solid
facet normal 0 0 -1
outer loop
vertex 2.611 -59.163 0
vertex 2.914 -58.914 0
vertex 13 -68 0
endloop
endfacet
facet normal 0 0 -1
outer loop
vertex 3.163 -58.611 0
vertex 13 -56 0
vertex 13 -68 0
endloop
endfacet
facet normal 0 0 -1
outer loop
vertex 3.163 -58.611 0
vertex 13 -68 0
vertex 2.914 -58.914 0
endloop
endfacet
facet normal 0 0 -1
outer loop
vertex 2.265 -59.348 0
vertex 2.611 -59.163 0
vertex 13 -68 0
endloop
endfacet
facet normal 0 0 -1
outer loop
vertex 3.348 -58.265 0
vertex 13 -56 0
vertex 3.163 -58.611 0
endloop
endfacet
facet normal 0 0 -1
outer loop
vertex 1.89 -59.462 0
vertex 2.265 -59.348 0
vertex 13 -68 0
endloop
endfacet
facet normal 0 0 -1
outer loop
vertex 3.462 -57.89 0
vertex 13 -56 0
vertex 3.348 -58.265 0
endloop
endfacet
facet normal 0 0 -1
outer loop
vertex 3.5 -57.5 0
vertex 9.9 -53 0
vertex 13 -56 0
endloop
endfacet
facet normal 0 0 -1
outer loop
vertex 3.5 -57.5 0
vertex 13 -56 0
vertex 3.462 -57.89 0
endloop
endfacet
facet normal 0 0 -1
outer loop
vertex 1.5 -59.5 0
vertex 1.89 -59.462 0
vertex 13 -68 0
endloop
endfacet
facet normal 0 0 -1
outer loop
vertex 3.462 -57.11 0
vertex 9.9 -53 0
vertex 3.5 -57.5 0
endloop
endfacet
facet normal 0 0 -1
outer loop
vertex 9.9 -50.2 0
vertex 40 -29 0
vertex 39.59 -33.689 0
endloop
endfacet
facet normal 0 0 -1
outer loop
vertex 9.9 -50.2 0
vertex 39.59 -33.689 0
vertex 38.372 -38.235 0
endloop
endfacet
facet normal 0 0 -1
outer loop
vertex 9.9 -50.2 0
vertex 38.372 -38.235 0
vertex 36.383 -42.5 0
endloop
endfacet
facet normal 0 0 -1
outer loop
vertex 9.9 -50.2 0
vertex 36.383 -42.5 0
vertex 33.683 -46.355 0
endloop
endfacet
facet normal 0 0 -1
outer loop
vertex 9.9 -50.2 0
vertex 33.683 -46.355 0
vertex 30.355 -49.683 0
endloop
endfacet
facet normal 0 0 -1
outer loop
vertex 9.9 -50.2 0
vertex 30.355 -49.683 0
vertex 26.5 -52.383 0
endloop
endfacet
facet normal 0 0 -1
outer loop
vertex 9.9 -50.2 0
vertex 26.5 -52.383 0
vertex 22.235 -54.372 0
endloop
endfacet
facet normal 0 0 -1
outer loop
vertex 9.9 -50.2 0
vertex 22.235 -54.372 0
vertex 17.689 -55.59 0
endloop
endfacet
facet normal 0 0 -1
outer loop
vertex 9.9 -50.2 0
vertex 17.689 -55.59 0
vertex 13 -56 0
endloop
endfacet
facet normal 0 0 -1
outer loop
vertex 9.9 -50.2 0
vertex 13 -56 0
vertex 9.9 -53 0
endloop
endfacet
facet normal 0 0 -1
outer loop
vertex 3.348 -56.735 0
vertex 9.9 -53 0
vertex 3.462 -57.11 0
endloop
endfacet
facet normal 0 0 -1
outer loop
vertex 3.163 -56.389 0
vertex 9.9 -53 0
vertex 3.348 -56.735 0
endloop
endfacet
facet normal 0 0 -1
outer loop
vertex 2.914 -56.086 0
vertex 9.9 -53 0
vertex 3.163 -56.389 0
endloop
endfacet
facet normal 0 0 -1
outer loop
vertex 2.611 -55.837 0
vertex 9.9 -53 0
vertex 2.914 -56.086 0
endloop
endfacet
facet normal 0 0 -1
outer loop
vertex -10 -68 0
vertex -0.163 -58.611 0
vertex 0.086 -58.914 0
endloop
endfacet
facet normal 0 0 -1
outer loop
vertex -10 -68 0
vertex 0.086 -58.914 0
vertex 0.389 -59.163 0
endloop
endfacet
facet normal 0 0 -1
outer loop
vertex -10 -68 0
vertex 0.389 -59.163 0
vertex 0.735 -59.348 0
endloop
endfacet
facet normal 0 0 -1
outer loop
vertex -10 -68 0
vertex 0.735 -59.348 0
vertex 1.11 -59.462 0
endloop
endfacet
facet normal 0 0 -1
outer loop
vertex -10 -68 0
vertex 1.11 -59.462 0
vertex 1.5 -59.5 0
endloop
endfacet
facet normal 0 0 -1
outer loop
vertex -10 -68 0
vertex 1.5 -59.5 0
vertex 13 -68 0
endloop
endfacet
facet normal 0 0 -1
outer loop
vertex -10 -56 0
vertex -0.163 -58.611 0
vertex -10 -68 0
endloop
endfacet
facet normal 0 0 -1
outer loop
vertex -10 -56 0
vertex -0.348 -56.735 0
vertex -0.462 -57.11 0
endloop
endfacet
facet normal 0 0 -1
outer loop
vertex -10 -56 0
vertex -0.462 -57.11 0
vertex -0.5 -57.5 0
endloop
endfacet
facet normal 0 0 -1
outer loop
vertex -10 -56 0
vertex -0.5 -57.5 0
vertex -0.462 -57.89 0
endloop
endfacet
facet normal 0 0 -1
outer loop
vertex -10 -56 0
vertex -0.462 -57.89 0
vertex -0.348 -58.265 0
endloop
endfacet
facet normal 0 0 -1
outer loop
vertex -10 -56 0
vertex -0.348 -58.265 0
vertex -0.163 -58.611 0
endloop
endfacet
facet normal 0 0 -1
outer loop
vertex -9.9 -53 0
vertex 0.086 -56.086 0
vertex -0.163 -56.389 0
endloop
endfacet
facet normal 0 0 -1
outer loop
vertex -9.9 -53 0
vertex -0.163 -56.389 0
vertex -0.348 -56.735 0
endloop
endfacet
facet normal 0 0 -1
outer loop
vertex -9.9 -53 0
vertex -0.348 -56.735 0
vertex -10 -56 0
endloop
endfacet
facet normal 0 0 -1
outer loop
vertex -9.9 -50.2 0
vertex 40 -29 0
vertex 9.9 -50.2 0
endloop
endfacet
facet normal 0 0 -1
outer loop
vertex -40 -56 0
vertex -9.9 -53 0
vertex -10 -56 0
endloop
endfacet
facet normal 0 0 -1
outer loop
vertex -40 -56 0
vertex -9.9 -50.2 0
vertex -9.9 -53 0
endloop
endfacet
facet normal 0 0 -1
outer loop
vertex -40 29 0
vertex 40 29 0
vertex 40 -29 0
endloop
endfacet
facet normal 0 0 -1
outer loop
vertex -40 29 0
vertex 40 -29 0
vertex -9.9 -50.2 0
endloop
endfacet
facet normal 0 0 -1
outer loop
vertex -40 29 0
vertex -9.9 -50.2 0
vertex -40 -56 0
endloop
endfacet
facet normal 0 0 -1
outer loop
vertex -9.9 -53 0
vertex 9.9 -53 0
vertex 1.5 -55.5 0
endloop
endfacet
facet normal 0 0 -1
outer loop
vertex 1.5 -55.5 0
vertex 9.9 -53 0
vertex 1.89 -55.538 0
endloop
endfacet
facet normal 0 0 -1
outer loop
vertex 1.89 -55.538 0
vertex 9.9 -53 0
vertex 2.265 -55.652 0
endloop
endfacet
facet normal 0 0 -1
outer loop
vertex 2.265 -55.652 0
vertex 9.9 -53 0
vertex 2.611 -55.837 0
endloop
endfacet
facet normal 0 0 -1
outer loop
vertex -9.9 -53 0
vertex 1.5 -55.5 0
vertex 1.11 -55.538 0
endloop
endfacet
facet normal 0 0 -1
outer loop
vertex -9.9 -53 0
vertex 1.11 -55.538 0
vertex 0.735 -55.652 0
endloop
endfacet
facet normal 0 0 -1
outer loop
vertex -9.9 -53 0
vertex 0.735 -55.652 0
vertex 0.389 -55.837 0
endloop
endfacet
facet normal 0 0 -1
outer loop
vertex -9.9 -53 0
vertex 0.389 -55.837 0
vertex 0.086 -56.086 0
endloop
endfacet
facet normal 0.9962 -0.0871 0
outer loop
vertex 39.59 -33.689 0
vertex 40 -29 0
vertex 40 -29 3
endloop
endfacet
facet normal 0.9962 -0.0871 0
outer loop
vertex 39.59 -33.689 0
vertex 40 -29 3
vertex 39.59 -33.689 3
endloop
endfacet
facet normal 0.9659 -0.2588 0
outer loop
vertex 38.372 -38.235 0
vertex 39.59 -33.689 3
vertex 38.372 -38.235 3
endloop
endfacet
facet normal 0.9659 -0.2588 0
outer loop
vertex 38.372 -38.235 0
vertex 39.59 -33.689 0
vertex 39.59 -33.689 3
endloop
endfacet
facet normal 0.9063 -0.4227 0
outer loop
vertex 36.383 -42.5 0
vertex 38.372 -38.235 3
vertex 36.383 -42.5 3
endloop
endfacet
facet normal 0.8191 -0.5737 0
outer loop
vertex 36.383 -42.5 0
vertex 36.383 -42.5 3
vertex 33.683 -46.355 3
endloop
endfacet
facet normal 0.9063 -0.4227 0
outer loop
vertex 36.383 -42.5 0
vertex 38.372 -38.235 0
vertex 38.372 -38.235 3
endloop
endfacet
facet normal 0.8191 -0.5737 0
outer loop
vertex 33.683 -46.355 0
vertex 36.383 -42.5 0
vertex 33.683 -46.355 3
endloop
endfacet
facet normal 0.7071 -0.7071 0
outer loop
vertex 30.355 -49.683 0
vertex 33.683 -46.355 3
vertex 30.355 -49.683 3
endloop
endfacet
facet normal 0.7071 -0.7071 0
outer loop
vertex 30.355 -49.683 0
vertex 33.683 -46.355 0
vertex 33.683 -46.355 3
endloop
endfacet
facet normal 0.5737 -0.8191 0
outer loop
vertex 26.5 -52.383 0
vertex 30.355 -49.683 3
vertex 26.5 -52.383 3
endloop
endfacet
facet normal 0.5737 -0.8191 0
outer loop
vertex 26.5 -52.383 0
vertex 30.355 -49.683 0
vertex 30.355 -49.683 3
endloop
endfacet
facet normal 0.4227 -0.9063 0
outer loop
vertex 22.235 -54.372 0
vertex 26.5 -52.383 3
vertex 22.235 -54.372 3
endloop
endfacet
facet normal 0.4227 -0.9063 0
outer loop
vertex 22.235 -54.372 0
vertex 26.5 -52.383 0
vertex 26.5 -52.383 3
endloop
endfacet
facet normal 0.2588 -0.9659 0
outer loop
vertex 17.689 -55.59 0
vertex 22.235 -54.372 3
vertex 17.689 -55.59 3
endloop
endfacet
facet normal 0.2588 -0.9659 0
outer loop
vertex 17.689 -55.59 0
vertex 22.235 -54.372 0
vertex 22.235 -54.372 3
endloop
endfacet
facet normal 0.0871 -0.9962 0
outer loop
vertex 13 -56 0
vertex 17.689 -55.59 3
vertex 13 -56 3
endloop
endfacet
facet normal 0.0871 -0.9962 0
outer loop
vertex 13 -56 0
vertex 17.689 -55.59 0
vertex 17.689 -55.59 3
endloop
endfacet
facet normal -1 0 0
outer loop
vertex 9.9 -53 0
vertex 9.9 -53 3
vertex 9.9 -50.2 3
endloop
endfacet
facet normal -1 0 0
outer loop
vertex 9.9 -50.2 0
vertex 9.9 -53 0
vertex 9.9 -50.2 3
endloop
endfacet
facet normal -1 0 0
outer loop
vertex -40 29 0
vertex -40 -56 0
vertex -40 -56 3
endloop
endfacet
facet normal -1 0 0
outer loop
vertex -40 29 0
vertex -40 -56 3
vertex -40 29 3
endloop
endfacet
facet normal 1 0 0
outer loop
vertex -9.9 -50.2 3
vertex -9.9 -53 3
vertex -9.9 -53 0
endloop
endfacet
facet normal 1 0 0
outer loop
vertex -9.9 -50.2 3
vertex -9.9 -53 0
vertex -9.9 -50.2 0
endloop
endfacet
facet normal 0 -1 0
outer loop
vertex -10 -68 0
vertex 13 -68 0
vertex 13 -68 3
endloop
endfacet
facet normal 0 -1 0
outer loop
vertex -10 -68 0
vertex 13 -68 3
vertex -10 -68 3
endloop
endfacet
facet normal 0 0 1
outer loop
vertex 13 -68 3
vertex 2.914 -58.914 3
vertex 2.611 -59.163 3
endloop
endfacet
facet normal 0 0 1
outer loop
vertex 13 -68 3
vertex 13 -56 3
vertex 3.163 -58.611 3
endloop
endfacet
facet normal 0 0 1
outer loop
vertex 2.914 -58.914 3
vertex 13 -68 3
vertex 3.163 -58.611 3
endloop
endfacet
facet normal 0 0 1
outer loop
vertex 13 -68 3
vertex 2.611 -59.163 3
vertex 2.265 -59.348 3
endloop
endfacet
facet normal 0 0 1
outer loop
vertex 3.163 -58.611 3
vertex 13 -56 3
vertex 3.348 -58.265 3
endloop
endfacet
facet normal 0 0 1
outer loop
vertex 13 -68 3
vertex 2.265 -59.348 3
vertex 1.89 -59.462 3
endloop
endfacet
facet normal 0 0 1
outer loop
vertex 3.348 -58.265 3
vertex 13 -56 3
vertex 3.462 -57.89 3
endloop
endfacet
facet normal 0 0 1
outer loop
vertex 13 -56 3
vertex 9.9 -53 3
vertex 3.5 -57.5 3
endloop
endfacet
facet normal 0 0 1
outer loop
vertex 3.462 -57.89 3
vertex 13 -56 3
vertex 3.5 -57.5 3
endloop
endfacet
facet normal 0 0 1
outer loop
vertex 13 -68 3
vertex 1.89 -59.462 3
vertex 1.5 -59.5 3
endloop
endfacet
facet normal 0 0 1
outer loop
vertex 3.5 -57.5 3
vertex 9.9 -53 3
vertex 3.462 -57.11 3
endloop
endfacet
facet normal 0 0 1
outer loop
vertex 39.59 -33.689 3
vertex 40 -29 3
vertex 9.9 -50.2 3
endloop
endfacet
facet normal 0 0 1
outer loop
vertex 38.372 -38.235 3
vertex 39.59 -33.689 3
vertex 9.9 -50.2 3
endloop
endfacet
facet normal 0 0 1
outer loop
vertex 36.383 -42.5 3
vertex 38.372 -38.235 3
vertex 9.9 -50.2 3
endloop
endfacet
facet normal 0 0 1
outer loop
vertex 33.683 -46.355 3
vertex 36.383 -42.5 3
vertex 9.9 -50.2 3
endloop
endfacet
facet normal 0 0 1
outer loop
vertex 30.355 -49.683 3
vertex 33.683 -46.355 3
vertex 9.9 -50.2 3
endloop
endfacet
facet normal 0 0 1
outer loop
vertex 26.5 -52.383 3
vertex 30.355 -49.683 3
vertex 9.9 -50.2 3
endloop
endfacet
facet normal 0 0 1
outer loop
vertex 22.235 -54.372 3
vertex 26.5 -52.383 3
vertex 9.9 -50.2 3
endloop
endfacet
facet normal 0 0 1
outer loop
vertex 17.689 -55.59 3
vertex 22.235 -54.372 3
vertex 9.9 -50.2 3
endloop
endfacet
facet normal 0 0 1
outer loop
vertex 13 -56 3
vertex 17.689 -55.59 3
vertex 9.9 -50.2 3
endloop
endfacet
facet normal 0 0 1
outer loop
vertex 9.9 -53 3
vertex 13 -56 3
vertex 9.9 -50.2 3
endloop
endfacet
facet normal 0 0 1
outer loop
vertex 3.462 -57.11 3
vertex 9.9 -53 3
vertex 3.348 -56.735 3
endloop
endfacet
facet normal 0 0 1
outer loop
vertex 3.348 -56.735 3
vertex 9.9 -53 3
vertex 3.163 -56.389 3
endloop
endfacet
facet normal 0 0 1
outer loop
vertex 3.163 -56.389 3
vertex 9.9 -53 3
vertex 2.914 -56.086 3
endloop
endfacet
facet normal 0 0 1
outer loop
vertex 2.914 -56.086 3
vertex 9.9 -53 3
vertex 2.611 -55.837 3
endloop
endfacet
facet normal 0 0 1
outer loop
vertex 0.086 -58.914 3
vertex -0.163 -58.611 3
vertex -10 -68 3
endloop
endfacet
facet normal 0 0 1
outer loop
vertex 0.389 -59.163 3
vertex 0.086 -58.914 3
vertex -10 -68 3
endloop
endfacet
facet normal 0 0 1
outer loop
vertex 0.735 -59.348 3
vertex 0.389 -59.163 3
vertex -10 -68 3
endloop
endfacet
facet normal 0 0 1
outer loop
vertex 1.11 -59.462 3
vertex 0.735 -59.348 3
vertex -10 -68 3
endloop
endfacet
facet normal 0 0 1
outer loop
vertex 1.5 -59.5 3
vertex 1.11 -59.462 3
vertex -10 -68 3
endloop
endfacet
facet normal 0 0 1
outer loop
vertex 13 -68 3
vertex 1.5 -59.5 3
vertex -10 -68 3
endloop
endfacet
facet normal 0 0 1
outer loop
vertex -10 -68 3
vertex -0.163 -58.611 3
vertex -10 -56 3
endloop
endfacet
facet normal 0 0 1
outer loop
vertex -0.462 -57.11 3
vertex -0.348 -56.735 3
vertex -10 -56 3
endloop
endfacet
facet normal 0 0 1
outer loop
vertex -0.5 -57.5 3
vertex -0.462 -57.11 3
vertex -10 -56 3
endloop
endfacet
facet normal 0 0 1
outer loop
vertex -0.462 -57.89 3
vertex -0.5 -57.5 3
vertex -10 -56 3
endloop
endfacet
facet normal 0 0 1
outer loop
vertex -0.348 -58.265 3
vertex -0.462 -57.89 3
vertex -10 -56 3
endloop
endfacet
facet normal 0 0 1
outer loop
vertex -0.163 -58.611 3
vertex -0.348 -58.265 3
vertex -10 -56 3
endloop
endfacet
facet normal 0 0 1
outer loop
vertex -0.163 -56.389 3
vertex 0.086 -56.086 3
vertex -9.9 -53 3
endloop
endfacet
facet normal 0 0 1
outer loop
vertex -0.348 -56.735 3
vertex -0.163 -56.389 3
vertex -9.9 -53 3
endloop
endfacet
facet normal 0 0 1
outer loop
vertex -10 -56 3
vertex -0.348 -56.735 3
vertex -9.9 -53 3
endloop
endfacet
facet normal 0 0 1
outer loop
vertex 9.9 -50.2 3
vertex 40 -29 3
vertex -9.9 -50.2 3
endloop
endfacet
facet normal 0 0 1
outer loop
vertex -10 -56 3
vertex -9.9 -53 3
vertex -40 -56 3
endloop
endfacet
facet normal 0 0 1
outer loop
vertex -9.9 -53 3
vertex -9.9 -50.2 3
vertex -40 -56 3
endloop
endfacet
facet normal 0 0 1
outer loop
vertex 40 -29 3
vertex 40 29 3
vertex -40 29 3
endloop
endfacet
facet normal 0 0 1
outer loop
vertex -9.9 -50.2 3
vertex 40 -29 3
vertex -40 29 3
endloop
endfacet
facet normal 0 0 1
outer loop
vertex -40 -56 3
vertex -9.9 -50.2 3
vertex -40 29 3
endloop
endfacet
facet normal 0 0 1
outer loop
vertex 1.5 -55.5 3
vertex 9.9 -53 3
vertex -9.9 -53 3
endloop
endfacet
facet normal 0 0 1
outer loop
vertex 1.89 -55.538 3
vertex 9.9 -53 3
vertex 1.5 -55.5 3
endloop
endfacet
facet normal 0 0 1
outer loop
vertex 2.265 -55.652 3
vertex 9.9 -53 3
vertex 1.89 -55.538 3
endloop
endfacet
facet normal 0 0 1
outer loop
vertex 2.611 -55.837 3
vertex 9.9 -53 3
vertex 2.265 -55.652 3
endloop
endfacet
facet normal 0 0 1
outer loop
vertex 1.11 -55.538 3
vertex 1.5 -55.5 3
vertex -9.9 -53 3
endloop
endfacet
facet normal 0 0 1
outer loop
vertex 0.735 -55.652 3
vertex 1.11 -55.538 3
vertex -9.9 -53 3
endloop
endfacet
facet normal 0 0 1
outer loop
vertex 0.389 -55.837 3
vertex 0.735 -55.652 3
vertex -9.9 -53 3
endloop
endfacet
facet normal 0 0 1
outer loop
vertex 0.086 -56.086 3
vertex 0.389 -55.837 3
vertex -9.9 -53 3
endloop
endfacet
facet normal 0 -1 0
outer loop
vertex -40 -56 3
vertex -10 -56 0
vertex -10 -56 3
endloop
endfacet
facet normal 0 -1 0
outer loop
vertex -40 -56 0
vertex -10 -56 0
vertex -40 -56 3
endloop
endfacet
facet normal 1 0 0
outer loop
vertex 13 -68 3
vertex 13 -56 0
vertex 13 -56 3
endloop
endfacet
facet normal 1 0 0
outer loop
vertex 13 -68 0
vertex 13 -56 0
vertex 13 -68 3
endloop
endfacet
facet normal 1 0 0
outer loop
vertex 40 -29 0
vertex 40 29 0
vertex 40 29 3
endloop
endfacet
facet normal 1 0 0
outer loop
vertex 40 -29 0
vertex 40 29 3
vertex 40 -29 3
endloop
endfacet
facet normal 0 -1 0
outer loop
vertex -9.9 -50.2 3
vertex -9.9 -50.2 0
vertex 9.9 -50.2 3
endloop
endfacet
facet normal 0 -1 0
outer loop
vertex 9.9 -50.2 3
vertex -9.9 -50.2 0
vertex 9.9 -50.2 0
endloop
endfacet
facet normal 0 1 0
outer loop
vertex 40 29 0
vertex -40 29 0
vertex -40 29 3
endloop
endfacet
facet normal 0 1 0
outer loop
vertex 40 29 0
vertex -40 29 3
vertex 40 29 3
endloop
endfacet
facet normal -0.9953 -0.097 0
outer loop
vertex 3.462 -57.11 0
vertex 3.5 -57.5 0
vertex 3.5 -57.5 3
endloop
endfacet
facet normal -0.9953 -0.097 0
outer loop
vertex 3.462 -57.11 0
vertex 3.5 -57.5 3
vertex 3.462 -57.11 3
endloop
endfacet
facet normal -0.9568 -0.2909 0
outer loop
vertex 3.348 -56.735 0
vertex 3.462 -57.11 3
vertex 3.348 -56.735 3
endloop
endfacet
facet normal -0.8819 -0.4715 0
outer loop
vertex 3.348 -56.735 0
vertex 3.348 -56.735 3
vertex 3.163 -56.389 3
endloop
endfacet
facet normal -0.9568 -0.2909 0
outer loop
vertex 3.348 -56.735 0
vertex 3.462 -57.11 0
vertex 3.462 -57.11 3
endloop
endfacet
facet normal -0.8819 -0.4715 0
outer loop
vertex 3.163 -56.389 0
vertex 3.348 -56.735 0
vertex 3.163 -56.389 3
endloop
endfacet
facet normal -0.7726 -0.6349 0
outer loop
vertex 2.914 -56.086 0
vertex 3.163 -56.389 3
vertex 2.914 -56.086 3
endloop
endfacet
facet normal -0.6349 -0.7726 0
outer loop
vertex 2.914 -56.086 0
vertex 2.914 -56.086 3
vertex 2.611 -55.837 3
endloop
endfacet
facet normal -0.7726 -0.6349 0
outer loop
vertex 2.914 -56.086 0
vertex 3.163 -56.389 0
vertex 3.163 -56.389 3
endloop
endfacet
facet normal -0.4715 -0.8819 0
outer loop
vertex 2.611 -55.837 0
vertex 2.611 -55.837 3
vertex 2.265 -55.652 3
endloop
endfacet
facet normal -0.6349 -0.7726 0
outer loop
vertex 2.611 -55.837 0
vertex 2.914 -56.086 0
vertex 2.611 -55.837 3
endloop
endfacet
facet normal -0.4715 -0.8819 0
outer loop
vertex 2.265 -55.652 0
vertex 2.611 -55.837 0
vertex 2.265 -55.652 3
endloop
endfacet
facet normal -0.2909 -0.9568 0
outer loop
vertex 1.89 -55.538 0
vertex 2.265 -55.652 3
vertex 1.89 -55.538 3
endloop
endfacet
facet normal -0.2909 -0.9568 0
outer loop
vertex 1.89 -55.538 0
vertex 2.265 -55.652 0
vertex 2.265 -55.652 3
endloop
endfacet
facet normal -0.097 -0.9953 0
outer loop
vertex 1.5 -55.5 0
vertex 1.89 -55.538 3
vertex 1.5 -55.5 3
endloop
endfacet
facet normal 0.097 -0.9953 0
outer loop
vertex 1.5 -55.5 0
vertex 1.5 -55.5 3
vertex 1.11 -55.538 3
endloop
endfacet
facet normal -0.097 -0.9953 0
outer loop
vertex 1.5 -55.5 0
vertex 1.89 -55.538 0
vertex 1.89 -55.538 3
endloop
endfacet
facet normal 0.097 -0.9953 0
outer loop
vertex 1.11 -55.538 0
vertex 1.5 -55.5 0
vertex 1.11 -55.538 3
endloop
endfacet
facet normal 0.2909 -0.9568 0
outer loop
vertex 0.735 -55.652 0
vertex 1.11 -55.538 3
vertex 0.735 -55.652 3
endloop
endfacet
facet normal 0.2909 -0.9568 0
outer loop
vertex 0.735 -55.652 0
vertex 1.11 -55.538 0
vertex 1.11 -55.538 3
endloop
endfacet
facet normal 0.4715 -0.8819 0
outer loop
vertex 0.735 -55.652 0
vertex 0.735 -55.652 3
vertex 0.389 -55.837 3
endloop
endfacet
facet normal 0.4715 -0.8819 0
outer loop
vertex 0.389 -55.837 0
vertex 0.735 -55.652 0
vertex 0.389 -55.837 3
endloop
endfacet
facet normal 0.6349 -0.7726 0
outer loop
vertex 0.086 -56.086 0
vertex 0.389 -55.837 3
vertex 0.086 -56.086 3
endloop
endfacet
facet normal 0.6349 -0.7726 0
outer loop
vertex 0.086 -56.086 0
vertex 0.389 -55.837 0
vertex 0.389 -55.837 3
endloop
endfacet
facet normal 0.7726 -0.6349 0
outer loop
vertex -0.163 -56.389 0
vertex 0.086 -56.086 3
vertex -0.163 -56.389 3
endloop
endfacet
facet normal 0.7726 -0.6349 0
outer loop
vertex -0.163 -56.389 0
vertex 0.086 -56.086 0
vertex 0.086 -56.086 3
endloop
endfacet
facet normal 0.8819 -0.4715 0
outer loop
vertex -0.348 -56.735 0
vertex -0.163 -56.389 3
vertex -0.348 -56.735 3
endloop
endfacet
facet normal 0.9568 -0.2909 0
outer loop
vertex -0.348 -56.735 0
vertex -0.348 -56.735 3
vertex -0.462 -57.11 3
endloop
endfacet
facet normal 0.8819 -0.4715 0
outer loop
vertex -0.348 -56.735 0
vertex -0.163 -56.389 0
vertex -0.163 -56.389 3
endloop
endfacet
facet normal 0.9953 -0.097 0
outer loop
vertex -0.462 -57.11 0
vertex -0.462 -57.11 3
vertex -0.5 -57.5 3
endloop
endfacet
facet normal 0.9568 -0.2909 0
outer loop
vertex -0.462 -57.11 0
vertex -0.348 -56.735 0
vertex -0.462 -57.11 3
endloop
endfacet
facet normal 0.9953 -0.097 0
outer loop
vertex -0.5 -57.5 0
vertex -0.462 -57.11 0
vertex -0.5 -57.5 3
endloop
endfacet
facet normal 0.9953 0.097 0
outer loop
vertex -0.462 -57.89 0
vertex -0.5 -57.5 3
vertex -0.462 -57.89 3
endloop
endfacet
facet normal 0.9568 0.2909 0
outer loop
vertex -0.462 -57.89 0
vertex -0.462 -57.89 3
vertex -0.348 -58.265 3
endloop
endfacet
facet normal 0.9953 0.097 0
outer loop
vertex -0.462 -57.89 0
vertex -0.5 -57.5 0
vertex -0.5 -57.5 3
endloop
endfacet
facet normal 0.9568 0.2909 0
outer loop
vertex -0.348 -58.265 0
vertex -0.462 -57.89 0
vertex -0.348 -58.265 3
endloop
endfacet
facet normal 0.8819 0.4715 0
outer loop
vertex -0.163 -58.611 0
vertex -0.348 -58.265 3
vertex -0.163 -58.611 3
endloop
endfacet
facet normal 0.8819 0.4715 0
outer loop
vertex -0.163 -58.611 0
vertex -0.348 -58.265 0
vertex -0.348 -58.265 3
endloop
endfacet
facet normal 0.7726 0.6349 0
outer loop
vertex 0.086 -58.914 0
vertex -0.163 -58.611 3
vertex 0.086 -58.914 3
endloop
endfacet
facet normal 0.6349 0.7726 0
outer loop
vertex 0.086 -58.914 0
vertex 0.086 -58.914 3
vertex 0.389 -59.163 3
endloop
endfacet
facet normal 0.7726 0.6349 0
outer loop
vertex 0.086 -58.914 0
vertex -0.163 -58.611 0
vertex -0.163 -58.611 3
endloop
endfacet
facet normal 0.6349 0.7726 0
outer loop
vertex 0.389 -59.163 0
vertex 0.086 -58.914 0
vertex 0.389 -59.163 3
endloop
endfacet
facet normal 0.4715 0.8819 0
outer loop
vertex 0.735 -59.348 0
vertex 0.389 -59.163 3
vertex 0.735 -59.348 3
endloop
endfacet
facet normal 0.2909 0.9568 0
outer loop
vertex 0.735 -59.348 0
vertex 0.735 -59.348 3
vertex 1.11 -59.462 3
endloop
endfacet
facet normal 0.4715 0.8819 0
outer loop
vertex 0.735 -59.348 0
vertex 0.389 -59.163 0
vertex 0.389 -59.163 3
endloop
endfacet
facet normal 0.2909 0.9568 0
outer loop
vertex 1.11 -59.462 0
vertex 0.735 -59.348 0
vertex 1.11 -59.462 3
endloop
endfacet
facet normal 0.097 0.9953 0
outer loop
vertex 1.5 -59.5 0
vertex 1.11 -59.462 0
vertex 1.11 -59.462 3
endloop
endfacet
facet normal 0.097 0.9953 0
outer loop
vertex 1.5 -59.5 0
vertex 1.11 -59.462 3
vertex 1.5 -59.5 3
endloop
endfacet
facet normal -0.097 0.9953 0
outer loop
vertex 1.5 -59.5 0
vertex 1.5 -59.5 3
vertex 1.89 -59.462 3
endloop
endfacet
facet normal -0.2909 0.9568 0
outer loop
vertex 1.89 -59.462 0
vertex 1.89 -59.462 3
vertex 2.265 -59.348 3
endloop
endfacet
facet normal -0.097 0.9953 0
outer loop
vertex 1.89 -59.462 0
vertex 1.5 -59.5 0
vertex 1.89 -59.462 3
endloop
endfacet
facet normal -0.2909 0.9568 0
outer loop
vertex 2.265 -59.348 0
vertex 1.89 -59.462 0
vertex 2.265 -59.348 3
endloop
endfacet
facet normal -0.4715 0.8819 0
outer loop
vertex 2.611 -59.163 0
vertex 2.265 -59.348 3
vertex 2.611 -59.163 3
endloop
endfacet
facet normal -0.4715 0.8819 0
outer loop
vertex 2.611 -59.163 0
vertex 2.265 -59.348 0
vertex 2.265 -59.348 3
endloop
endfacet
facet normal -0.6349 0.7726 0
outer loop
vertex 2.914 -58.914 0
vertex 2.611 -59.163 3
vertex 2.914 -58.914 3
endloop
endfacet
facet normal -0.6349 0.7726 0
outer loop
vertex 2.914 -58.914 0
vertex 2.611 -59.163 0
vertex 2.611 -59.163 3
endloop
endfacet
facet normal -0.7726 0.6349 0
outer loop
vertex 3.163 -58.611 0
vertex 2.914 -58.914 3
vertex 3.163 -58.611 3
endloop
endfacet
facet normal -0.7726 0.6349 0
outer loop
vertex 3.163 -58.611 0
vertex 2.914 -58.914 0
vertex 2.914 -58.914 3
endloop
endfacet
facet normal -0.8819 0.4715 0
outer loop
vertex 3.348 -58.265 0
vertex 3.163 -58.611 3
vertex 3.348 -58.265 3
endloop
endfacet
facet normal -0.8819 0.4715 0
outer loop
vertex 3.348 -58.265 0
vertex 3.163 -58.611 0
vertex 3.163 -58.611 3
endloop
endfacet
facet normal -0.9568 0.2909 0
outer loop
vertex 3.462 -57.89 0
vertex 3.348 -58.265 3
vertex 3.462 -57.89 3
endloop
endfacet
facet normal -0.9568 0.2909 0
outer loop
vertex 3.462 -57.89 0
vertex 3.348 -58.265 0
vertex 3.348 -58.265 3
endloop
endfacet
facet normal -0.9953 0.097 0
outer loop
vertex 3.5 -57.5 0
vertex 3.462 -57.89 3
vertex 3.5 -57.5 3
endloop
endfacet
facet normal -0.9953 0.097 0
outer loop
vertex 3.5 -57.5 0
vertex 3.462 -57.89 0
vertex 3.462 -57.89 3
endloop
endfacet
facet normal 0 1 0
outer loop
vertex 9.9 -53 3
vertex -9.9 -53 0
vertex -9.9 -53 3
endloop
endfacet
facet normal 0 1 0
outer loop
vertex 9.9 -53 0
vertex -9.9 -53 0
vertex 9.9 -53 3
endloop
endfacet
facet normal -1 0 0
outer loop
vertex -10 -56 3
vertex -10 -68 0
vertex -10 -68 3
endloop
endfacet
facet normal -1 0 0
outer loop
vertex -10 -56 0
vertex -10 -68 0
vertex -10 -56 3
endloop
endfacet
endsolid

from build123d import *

# Parameters (mm, degrees)
CROQUIS1_R              = 2
CROQUIS1_W              = 19.8
CROQUIS1_H              = 2.8
SALIENTE_EXTRUIR1_DEPTH = 3


with BuildPart() as part:
    # Croquis1 → Saliente-Extruir1 (new body)
    with BuildSketch(Plane.XY):
        with BuildLine():
            Line((-40, 29), (40, 29))
            Line((40, 29), (40, -29))
            ThreePointArc((40, -29), (32.091883092, -48.091883092), (13, -56))
            Line((13, -56), (13, -68))
            Line((13, -68), (-10, -68))
            Line((-10, -68), (-10, -56))
            Line((-10, -56), (-40, -56))
            Line((-40, -56), (-40, 29))
        make_face()
        with Locations((1.5, -57.5)):
            Circle(CROQUIS1_R, mode=Mode.SUBTRACT)
        with Locations((0, -51.6)):
            Rectangle(CROQUIS1_W, CROQUIS1_H, mode=Mode.SUBTRACT)
    extrude(amount=SALIENTE_EXTRUIR1_DEPTH)


solid = part.part
